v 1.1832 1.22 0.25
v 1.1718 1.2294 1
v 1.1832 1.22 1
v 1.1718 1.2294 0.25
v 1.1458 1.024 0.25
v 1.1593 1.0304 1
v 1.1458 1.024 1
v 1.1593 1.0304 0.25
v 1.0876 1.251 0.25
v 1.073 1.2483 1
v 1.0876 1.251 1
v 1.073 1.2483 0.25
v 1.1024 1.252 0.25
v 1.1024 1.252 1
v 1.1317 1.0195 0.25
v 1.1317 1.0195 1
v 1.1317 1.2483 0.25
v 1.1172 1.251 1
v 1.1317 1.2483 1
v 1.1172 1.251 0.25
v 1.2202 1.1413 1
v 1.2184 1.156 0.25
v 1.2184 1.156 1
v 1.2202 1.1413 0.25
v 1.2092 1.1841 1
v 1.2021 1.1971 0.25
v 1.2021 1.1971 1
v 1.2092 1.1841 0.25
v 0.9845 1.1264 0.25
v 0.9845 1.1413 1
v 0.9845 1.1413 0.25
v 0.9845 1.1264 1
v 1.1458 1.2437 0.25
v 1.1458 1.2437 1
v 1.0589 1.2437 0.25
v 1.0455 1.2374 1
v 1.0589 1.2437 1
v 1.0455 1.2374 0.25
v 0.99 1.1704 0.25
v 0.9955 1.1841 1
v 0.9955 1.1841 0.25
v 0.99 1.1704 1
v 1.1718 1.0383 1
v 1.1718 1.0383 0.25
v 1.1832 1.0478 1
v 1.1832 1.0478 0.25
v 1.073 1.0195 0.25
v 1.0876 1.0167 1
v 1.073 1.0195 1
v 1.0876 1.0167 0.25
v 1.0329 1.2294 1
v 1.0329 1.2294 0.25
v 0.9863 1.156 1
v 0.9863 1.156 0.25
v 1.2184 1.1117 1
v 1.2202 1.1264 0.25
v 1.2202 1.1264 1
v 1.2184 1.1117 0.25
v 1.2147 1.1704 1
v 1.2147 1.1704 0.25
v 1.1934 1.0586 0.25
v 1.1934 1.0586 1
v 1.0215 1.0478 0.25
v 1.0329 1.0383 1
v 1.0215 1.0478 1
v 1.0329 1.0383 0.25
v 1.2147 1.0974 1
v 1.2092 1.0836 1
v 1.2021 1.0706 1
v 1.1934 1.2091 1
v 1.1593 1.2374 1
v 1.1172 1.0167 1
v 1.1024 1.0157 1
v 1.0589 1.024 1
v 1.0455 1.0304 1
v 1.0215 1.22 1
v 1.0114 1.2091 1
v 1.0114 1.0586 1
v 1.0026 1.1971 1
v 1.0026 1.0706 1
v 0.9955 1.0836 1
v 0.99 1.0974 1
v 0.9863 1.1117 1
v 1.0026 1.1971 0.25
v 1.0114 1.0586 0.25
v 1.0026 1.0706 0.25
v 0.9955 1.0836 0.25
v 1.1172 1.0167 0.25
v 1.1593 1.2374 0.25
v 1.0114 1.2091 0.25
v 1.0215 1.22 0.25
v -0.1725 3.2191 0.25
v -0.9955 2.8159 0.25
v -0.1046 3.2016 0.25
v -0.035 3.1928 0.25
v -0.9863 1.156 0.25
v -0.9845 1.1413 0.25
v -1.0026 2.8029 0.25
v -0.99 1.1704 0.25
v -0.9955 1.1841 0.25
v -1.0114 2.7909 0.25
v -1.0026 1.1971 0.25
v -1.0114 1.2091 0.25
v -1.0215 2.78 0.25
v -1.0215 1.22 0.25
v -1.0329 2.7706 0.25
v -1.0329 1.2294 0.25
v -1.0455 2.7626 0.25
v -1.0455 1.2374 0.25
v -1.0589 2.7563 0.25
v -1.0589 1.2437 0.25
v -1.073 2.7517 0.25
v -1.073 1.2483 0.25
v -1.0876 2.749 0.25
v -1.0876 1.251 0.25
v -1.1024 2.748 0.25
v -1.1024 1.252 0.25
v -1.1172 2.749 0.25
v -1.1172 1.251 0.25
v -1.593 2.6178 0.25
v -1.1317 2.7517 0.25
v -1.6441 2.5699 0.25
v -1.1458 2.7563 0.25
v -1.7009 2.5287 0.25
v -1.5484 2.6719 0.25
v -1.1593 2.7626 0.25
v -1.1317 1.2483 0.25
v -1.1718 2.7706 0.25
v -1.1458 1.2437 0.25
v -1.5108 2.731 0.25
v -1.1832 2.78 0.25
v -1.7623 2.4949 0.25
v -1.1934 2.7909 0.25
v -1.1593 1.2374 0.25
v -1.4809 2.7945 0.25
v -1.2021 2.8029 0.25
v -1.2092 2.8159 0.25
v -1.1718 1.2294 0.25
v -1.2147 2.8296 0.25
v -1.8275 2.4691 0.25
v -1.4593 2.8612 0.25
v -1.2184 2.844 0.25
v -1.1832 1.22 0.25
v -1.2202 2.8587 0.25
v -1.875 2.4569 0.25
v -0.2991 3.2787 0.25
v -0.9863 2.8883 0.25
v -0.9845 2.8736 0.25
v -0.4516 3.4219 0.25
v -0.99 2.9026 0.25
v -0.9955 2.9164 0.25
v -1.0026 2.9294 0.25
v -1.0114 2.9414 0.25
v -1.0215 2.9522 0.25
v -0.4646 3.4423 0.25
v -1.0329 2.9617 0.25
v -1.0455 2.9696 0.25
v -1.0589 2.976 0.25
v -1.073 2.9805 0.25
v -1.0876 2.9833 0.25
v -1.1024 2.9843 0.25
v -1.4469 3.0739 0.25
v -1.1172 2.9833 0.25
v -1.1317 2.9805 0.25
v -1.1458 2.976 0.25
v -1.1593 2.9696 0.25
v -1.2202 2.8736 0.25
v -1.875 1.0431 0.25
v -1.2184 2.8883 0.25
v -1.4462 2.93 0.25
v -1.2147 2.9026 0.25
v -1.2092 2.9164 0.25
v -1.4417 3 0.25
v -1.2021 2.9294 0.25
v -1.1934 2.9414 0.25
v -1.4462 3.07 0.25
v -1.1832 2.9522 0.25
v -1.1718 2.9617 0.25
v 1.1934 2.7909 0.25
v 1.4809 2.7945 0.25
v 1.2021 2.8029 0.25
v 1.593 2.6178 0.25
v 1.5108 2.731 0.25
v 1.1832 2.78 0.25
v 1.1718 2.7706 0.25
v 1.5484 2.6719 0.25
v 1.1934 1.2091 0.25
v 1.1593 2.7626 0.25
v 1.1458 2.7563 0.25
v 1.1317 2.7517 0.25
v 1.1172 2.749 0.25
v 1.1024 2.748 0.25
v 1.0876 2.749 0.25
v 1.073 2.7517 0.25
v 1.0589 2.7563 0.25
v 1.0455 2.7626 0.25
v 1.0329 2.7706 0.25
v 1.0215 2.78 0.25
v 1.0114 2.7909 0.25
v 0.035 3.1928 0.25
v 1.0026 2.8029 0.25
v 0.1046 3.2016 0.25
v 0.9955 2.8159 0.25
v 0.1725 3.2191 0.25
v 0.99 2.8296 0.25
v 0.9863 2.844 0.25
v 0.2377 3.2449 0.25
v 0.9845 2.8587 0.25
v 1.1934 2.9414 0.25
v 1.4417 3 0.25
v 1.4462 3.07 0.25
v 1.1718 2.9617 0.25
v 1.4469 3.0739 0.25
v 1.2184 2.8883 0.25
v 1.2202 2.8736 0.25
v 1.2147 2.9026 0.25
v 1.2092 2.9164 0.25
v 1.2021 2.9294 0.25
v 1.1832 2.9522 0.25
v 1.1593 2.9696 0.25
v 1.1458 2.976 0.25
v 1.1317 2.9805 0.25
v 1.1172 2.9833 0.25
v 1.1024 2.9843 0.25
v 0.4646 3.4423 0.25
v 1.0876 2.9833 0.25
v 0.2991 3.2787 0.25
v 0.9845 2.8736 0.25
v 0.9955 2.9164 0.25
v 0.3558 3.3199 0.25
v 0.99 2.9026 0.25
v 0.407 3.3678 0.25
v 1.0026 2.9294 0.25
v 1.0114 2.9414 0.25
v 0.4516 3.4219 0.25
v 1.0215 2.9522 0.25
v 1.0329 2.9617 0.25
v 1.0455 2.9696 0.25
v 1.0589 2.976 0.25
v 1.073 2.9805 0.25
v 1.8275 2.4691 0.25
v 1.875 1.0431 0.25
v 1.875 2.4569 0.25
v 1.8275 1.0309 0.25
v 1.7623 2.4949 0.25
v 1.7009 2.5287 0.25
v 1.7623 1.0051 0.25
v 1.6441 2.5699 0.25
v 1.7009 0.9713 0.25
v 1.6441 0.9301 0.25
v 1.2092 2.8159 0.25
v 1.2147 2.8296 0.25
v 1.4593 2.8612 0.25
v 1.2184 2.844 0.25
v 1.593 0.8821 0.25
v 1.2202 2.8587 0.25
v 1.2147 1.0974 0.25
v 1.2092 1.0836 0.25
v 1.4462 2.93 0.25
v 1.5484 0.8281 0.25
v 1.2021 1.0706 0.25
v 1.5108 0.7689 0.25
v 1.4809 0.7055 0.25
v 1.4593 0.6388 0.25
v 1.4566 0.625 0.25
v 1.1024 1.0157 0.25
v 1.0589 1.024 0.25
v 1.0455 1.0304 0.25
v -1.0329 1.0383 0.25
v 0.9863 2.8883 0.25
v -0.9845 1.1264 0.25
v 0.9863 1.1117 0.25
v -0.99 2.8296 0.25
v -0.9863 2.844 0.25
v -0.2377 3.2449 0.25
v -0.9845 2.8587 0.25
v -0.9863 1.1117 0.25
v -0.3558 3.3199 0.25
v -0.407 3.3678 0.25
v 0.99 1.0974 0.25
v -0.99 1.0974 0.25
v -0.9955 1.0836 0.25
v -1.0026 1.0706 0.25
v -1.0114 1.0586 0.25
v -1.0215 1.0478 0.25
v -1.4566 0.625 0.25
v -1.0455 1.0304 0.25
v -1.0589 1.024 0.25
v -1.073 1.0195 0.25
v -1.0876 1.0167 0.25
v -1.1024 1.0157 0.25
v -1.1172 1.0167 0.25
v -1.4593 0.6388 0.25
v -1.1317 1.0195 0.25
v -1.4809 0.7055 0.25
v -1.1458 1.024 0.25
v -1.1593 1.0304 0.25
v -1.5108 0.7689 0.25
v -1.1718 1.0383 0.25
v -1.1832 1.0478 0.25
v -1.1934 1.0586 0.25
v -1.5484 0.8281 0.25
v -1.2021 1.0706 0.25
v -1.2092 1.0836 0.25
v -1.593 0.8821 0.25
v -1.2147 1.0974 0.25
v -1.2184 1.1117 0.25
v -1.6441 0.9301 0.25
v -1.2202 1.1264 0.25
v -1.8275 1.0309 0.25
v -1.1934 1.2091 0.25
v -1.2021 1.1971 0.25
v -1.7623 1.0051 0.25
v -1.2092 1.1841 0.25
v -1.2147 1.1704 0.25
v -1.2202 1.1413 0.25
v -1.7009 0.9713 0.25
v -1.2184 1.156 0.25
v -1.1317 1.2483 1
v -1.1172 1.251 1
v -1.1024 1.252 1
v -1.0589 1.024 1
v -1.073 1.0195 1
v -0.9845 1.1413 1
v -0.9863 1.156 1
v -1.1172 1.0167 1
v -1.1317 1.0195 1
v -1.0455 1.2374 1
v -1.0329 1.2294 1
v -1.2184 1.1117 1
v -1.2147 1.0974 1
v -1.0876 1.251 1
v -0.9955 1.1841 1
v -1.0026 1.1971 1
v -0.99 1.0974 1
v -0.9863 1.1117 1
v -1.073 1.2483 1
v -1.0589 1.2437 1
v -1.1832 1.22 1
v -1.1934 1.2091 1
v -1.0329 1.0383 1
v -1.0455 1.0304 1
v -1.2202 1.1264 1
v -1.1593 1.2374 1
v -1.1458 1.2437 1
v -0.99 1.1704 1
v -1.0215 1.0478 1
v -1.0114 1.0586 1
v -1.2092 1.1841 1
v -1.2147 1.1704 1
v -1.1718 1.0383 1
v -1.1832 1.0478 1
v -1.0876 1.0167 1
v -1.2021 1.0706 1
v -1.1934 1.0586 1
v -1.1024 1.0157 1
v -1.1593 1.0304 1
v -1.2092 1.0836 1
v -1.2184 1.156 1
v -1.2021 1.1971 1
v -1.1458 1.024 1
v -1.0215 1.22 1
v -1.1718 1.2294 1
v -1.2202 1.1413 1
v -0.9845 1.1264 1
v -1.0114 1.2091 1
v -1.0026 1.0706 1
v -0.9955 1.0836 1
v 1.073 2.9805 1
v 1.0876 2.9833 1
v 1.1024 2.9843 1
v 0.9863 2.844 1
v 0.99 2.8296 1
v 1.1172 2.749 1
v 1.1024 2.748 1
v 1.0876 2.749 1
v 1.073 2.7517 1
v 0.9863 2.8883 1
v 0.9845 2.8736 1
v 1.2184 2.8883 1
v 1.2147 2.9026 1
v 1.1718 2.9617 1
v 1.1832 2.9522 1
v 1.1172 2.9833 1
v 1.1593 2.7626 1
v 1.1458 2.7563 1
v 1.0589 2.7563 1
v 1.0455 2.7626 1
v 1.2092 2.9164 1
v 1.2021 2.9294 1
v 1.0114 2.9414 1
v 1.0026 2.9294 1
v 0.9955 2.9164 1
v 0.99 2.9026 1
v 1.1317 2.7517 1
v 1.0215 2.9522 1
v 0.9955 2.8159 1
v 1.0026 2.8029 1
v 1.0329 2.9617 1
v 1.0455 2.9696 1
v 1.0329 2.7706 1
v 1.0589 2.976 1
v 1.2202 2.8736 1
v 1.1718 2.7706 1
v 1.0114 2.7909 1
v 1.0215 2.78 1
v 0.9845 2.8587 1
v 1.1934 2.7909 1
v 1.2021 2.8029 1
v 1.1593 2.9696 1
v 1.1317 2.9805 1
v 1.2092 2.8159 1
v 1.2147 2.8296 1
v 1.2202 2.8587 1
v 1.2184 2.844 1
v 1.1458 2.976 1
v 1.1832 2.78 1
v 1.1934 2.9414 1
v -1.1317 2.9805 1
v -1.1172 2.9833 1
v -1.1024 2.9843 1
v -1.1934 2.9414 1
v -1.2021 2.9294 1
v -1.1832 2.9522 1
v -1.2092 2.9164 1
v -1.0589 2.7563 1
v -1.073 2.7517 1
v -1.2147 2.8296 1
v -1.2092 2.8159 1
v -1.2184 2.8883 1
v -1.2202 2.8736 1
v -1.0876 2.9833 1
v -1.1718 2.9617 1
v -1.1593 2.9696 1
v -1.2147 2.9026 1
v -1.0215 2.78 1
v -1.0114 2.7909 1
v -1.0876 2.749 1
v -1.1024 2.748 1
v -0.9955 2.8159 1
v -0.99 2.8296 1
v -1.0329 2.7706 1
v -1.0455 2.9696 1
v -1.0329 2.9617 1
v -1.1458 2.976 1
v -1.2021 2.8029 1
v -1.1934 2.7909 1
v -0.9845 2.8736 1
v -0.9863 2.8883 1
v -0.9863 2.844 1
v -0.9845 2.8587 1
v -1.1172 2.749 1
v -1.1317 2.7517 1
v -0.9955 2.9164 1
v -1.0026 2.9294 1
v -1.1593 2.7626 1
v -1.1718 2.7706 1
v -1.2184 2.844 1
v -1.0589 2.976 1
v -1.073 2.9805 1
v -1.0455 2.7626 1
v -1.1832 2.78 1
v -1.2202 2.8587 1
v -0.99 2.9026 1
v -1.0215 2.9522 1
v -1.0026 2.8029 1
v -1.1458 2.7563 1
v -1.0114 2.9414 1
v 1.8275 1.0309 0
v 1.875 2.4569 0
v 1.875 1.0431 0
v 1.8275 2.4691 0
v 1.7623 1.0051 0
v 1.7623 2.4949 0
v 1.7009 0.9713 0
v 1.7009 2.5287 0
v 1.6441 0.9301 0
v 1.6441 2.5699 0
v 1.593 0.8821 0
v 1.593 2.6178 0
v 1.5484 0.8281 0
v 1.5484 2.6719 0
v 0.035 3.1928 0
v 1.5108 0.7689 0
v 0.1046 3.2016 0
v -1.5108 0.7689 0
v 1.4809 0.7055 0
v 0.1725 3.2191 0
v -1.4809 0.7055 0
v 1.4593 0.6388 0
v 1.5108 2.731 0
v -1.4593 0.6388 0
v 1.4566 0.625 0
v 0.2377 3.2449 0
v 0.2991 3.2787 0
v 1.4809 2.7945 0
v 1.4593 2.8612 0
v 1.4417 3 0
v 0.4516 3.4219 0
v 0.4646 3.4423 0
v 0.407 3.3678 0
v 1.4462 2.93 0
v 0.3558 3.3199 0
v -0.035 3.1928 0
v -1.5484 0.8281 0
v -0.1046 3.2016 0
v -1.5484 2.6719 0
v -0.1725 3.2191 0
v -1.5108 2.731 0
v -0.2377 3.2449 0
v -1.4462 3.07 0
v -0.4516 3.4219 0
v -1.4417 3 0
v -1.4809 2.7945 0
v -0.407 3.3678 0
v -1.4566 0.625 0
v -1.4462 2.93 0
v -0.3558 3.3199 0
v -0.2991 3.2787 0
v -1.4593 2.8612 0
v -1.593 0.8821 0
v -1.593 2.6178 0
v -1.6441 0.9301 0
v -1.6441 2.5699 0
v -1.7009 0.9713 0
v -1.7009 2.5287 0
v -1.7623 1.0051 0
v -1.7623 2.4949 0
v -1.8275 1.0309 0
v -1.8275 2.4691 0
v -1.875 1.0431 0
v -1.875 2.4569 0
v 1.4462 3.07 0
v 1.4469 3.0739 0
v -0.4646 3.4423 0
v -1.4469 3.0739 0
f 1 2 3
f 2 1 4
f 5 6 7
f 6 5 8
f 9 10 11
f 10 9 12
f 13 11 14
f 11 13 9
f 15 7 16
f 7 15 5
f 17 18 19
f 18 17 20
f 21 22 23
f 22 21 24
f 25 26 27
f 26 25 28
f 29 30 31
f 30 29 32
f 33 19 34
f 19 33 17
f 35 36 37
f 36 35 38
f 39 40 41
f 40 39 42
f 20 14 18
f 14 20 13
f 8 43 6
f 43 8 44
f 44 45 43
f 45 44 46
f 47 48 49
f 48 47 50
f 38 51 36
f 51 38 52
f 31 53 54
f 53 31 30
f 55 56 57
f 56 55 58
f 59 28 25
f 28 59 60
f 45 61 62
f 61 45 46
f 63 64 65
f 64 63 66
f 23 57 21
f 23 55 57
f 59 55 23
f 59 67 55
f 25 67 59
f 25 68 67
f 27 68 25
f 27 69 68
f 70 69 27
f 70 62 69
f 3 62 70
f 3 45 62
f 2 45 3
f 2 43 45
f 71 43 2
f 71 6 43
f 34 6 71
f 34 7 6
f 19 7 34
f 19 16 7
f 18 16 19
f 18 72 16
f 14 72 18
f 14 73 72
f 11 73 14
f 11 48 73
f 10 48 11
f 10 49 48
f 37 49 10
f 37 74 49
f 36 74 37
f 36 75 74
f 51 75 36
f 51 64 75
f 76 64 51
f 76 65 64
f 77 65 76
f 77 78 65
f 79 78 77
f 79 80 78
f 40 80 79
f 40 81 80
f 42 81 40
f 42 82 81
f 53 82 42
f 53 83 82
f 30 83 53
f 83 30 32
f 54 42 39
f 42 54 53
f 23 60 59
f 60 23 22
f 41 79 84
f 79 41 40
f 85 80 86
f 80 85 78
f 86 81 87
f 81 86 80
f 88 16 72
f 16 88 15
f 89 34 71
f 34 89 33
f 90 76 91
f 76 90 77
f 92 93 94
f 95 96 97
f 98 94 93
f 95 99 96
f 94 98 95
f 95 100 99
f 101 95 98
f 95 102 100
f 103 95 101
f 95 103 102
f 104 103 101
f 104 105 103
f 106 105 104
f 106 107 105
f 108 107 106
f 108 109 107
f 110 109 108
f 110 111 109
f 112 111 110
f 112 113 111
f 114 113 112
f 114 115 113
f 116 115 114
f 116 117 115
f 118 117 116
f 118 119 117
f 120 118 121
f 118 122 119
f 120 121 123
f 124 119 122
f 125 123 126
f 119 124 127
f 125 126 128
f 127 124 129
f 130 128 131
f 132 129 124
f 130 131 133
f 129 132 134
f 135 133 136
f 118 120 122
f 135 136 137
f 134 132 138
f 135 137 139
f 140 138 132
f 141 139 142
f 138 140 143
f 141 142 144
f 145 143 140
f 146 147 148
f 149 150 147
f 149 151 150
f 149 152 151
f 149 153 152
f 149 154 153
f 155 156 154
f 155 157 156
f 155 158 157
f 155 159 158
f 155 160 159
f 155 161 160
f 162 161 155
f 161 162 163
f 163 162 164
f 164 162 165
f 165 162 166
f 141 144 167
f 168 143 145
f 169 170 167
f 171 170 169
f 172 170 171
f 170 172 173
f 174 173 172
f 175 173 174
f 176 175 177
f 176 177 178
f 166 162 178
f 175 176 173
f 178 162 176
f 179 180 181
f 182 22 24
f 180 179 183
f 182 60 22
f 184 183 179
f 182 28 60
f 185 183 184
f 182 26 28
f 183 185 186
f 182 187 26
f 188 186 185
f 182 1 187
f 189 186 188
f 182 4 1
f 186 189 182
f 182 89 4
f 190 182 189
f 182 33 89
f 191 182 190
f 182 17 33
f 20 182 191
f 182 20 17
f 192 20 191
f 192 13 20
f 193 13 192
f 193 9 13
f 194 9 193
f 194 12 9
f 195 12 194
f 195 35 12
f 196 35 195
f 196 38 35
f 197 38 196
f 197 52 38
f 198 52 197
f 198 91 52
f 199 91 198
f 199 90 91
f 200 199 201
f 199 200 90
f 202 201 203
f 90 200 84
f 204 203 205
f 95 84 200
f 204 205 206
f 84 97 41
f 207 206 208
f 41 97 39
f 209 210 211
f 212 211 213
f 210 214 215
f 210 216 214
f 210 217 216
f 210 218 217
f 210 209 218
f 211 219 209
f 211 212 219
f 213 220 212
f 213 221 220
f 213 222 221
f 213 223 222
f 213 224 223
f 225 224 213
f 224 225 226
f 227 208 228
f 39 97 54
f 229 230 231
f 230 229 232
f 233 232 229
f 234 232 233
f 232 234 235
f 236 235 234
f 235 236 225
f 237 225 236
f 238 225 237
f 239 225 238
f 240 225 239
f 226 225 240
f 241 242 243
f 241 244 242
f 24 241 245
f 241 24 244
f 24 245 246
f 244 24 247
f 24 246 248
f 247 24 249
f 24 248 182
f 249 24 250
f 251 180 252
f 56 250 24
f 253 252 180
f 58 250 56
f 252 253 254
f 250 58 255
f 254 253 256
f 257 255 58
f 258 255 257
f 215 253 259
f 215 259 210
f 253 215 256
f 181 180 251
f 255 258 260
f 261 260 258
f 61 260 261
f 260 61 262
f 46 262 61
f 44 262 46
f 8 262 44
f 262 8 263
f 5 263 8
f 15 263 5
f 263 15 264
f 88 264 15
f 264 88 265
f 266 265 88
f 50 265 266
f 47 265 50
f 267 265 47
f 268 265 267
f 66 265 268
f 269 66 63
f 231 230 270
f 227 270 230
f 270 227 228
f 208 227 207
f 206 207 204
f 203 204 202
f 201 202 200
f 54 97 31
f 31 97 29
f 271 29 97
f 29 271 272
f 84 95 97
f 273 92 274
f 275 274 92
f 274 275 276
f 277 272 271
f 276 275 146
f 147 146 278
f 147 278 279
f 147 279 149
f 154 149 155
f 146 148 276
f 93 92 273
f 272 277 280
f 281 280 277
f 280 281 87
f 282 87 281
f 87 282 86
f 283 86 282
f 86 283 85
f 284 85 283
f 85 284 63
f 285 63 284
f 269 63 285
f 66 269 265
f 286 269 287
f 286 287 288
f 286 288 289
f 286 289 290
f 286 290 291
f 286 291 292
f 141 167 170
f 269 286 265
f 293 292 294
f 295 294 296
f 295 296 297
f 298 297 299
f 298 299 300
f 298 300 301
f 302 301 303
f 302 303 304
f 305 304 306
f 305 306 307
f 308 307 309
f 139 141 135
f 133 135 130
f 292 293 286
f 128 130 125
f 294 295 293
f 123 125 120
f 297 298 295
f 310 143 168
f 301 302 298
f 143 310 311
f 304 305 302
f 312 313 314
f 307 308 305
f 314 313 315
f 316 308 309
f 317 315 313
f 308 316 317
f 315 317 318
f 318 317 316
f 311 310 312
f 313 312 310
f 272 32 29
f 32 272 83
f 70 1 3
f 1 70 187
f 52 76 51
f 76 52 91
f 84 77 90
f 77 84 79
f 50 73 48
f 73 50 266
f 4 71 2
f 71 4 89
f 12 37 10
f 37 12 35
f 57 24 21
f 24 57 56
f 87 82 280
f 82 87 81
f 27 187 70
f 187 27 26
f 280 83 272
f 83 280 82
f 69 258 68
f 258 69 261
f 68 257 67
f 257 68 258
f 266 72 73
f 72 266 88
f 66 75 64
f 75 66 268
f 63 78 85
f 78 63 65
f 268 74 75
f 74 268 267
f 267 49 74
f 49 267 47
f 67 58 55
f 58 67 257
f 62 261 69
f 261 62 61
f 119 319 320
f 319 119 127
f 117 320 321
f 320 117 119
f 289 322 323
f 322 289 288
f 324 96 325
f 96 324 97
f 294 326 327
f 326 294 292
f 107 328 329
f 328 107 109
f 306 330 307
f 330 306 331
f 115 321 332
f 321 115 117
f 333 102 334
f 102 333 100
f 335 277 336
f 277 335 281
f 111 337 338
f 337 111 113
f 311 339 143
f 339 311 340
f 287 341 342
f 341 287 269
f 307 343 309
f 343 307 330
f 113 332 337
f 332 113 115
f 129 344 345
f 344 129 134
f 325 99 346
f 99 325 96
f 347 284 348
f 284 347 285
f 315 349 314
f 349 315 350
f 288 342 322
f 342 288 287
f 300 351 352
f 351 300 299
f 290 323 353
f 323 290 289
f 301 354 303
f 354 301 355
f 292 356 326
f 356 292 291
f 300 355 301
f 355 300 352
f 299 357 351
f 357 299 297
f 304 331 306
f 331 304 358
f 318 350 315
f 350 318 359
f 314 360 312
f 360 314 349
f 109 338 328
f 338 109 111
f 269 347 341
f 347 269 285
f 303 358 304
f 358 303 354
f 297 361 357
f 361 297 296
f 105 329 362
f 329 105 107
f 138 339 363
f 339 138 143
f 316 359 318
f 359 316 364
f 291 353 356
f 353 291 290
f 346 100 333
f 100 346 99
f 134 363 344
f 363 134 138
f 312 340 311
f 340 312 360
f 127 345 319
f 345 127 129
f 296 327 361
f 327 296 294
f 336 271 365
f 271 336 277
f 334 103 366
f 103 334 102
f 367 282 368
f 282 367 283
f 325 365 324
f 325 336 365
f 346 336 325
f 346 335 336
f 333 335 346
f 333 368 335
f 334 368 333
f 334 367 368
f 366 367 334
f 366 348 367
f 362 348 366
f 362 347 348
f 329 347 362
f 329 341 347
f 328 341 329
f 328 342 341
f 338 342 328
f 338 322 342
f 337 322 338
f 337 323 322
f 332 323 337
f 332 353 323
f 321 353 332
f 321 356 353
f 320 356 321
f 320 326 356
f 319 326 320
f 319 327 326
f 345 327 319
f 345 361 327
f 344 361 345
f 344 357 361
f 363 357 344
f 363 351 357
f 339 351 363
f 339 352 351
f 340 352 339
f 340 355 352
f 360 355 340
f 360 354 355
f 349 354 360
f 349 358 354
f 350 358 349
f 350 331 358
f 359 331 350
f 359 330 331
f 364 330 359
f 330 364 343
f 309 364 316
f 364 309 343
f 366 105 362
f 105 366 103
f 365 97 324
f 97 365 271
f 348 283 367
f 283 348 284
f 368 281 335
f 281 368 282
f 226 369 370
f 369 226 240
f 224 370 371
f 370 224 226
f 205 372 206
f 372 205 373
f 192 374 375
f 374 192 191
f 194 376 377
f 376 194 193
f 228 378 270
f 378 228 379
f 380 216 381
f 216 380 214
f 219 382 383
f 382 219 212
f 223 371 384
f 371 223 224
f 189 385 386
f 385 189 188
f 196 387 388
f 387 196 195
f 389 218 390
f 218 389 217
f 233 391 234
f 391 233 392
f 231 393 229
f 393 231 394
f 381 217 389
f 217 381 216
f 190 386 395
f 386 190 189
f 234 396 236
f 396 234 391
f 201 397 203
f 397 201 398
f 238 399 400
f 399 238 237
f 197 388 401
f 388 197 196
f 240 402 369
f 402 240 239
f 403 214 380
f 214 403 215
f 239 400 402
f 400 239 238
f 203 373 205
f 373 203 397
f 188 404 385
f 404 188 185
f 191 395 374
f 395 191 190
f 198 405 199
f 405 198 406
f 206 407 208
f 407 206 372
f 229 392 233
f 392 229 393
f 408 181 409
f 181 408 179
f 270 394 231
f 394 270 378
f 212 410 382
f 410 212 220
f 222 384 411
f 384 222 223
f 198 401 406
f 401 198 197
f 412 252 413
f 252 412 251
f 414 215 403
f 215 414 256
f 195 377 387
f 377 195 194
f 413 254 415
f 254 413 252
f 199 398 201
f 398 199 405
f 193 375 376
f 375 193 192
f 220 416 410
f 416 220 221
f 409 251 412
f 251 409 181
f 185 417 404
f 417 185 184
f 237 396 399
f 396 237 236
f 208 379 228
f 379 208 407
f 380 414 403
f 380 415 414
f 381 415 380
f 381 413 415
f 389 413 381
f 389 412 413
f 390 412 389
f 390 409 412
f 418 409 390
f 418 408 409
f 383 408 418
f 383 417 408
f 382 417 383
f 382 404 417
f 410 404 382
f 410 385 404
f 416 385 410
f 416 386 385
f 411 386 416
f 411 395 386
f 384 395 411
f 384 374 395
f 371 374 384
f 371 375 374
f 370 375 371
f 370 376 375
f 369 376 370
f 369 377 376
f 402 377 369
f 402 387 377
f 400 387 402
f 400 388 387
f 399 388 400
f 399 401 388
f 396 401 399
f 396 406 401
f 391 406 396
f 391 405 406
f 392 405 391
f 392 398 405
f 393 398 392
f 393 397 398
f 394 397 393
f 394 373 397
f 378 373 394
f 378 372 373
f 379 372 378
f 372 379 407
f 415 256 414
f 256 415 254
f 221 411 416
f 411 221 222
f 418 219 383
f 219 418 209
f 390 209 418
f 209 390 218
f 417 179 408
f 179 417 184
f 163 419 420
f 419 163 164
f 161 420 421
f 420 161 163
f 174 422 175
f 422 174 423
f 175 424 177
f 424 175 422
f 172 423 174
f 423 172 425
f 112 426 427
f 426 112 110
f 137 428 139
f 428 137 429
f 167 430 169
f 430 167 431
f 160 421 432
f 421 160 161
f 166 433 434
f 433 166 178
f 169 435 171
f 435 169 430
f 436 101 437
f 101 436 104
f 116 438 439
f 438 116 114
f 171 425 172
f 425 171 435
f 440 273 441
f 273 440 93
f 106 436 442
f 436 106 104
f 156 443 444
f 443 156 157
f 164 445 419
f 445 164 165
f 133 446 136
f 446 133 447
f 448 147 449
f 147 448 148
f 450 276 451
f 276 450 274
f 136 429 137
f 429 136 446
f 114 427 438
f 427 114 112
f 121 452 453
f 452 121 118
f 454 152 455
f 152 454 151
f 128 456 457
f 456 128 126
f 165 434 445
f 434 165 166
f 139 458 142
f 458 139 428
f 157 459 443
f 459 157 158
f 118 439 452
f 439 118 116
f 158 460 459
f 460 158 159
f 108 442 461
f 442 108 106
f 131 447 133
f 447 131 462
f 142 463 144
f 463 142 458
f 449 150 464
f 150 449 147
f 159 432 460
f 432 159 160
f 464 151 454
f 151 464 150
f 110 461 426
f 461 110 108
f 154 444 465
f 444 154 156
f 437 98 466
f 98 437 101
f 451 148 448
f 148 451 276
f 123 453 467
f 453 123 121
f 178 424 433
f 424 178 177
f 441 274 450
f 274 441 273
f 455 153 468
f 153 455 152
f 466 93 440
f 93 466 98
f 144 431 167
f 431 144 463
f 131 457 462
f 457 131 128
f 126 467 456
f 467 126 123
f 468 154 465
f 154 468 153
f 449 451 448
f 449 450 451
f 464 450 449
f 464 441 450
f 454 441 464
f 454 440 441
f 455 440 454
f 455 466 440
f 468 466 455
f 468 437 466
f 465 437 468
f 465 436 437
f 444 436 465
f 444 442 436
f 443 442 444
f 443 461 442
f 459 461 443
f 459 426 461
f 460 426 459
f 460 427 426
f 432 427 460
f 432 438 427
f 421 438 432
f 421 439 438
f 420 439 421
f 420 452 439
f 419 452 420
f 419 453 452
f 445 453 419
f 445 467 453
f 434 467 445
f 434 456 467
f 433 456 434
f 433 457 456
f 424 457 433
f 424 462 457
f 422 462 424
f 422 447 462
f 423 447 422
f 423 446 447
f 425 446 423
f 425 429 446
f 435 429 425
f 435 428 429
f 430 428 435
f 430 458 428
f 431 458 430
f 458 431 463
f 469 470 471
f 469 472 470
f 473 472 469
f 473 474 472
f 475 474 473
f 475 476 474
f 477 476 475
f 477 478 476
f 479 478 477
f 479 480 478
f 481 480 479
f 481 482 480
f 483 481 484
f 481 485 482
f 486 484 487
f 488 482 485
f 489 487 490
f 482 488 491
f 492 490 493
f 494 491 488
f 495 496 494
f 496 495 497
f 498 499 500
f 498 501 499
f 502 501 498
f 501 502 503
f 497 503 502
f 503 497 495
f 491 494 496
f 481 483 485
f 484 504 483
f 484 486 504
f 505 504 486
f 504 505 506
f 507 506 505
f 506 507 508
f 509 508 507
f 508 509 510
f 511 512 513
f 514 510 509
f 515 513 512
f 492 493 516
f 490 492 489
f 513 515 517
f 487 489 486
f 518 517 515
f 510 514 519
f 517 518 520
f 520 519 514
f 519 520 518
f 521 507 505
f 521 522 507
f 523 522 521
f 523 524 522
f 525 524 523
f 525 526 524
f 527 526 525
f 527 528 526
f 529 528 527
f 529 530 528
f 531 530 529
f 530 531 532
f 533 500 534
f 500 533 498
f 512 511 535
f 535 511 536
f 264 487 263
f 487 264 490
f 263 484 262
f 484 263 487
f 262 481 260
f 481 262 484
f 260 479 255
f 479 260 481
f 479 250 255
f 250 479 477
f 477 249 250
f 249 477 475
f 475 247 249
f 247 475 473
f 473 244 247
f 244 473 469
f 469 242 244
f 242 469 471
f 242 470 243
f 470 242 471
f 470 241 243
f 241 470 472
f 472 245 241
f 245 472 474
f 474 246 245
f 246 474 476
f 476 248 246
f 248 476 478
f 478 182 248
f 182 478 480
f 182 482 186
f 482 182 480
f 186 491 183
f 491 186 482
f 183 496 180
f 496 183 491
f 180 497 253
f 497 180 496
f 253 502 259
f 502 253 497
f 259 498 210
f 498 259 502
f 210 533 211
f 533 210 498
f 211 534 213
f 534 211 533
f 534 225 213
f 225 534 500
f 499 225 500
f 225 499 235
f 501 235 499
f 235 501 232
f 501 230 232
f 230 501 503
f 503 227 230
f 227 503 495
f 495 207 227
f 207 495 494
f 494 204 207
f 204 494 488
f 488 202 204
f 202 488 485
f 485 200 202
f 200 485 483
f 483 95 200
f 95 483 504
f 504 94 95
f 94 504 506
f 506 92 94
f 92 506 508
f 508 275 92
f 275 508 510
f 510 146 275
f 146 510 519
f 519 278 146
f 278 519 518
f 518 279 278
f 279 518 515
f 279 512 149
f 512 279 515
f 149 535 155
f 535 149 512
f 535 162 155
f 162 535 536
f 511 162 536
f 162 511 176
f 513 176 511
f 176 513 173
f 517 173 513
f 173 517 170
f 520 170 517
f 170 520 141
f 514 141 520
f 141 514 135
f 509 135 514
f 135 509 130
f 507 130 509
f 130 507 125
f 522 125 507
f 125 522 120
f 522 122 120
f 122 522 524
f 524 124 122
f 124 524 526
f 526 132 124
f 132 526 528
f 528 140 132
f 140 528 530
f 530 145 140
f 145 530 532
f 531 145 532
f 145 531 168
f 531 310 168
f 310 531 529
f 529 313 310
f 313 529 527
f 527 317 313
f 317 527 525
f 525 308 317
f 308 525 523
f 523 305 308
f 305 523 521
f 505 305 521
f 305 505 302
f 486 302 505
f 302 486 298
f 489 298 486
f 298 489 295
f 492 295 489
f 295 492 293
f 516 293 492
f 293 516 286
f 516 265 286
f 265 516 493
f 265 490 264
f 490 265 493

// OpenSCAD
// file: constants.scad
width = 5;
left_depth = 4.25;
right_depth = 3.5;
height = 6.5;
top_height = 3/4;

wood_base_thickness = 3/4;

upright_diameter = 5/8;
wood_base_corner_diameter = 1;
wood_color = "brown";

upright_cap_height = 3/16;
upright_cap_diameter = 0.866; 

top_form_thickness = 3/4;
top_form_corner_diameter = 3/4;
top_form_top_radius = 1/4;
top_form_fancy_inset = 1/64;

transformer_dimensions = [2.61, 2.34, 2.68];
transformer_position = [
    -(transformer_dimensions.x/2),
    wood_base_corner_diameter,
    wood_base_thickness + 0.25
];

upright_positions =
  let (
    edge_distance = wood_base_corner_diameter/2
  ) [
    [-width/2 + edge_distance, edge_distance],
    [ width/2 - edge_distance, edge_distance],
    [ width/2 - edge_distance, right_depth - edge_distance],
    [ 0,                       left_depth - edge_distance],
    [-width/2 + edge_distance, right_depth - edge_distance]
  ];
// main file
include <constants.scad>;

$fn = 50;


module baseplate() {
    inset = 1/8;
    thickness = 1/4;

    linear_extrude(height=thickness)
    offset(delta=-inset)
    difference() {
        polygon(points=[
            each upright_positions,
            upright_positions[0]
        ]);
        for (p = upright_positions)
            translate(p) circle(d=upright_cap_diameter);
    }
}

module transformer_mount() {
    transformer_hole_spacing_x = 44 / 25.4;
    transformer_hole_spacing_y = 56 / 25.4;
    spacer_diameter = 6 / 25.4;
    spacer_height = 3/4;
    
    for (x = [-transformer_hole_spacing_x/2, +transformer_hole_spacing_x/2])
    for (y = [-transformer_hole_spacing_y/2, +transformer_hole_spacing_y/2])
    translate([x,y,0]) cylinder(d=spacer_diameter, h=spacer_height);
}

baseplate();
translate([0,2,1/4]) rotate([0,0,90]) transformer_mount();
